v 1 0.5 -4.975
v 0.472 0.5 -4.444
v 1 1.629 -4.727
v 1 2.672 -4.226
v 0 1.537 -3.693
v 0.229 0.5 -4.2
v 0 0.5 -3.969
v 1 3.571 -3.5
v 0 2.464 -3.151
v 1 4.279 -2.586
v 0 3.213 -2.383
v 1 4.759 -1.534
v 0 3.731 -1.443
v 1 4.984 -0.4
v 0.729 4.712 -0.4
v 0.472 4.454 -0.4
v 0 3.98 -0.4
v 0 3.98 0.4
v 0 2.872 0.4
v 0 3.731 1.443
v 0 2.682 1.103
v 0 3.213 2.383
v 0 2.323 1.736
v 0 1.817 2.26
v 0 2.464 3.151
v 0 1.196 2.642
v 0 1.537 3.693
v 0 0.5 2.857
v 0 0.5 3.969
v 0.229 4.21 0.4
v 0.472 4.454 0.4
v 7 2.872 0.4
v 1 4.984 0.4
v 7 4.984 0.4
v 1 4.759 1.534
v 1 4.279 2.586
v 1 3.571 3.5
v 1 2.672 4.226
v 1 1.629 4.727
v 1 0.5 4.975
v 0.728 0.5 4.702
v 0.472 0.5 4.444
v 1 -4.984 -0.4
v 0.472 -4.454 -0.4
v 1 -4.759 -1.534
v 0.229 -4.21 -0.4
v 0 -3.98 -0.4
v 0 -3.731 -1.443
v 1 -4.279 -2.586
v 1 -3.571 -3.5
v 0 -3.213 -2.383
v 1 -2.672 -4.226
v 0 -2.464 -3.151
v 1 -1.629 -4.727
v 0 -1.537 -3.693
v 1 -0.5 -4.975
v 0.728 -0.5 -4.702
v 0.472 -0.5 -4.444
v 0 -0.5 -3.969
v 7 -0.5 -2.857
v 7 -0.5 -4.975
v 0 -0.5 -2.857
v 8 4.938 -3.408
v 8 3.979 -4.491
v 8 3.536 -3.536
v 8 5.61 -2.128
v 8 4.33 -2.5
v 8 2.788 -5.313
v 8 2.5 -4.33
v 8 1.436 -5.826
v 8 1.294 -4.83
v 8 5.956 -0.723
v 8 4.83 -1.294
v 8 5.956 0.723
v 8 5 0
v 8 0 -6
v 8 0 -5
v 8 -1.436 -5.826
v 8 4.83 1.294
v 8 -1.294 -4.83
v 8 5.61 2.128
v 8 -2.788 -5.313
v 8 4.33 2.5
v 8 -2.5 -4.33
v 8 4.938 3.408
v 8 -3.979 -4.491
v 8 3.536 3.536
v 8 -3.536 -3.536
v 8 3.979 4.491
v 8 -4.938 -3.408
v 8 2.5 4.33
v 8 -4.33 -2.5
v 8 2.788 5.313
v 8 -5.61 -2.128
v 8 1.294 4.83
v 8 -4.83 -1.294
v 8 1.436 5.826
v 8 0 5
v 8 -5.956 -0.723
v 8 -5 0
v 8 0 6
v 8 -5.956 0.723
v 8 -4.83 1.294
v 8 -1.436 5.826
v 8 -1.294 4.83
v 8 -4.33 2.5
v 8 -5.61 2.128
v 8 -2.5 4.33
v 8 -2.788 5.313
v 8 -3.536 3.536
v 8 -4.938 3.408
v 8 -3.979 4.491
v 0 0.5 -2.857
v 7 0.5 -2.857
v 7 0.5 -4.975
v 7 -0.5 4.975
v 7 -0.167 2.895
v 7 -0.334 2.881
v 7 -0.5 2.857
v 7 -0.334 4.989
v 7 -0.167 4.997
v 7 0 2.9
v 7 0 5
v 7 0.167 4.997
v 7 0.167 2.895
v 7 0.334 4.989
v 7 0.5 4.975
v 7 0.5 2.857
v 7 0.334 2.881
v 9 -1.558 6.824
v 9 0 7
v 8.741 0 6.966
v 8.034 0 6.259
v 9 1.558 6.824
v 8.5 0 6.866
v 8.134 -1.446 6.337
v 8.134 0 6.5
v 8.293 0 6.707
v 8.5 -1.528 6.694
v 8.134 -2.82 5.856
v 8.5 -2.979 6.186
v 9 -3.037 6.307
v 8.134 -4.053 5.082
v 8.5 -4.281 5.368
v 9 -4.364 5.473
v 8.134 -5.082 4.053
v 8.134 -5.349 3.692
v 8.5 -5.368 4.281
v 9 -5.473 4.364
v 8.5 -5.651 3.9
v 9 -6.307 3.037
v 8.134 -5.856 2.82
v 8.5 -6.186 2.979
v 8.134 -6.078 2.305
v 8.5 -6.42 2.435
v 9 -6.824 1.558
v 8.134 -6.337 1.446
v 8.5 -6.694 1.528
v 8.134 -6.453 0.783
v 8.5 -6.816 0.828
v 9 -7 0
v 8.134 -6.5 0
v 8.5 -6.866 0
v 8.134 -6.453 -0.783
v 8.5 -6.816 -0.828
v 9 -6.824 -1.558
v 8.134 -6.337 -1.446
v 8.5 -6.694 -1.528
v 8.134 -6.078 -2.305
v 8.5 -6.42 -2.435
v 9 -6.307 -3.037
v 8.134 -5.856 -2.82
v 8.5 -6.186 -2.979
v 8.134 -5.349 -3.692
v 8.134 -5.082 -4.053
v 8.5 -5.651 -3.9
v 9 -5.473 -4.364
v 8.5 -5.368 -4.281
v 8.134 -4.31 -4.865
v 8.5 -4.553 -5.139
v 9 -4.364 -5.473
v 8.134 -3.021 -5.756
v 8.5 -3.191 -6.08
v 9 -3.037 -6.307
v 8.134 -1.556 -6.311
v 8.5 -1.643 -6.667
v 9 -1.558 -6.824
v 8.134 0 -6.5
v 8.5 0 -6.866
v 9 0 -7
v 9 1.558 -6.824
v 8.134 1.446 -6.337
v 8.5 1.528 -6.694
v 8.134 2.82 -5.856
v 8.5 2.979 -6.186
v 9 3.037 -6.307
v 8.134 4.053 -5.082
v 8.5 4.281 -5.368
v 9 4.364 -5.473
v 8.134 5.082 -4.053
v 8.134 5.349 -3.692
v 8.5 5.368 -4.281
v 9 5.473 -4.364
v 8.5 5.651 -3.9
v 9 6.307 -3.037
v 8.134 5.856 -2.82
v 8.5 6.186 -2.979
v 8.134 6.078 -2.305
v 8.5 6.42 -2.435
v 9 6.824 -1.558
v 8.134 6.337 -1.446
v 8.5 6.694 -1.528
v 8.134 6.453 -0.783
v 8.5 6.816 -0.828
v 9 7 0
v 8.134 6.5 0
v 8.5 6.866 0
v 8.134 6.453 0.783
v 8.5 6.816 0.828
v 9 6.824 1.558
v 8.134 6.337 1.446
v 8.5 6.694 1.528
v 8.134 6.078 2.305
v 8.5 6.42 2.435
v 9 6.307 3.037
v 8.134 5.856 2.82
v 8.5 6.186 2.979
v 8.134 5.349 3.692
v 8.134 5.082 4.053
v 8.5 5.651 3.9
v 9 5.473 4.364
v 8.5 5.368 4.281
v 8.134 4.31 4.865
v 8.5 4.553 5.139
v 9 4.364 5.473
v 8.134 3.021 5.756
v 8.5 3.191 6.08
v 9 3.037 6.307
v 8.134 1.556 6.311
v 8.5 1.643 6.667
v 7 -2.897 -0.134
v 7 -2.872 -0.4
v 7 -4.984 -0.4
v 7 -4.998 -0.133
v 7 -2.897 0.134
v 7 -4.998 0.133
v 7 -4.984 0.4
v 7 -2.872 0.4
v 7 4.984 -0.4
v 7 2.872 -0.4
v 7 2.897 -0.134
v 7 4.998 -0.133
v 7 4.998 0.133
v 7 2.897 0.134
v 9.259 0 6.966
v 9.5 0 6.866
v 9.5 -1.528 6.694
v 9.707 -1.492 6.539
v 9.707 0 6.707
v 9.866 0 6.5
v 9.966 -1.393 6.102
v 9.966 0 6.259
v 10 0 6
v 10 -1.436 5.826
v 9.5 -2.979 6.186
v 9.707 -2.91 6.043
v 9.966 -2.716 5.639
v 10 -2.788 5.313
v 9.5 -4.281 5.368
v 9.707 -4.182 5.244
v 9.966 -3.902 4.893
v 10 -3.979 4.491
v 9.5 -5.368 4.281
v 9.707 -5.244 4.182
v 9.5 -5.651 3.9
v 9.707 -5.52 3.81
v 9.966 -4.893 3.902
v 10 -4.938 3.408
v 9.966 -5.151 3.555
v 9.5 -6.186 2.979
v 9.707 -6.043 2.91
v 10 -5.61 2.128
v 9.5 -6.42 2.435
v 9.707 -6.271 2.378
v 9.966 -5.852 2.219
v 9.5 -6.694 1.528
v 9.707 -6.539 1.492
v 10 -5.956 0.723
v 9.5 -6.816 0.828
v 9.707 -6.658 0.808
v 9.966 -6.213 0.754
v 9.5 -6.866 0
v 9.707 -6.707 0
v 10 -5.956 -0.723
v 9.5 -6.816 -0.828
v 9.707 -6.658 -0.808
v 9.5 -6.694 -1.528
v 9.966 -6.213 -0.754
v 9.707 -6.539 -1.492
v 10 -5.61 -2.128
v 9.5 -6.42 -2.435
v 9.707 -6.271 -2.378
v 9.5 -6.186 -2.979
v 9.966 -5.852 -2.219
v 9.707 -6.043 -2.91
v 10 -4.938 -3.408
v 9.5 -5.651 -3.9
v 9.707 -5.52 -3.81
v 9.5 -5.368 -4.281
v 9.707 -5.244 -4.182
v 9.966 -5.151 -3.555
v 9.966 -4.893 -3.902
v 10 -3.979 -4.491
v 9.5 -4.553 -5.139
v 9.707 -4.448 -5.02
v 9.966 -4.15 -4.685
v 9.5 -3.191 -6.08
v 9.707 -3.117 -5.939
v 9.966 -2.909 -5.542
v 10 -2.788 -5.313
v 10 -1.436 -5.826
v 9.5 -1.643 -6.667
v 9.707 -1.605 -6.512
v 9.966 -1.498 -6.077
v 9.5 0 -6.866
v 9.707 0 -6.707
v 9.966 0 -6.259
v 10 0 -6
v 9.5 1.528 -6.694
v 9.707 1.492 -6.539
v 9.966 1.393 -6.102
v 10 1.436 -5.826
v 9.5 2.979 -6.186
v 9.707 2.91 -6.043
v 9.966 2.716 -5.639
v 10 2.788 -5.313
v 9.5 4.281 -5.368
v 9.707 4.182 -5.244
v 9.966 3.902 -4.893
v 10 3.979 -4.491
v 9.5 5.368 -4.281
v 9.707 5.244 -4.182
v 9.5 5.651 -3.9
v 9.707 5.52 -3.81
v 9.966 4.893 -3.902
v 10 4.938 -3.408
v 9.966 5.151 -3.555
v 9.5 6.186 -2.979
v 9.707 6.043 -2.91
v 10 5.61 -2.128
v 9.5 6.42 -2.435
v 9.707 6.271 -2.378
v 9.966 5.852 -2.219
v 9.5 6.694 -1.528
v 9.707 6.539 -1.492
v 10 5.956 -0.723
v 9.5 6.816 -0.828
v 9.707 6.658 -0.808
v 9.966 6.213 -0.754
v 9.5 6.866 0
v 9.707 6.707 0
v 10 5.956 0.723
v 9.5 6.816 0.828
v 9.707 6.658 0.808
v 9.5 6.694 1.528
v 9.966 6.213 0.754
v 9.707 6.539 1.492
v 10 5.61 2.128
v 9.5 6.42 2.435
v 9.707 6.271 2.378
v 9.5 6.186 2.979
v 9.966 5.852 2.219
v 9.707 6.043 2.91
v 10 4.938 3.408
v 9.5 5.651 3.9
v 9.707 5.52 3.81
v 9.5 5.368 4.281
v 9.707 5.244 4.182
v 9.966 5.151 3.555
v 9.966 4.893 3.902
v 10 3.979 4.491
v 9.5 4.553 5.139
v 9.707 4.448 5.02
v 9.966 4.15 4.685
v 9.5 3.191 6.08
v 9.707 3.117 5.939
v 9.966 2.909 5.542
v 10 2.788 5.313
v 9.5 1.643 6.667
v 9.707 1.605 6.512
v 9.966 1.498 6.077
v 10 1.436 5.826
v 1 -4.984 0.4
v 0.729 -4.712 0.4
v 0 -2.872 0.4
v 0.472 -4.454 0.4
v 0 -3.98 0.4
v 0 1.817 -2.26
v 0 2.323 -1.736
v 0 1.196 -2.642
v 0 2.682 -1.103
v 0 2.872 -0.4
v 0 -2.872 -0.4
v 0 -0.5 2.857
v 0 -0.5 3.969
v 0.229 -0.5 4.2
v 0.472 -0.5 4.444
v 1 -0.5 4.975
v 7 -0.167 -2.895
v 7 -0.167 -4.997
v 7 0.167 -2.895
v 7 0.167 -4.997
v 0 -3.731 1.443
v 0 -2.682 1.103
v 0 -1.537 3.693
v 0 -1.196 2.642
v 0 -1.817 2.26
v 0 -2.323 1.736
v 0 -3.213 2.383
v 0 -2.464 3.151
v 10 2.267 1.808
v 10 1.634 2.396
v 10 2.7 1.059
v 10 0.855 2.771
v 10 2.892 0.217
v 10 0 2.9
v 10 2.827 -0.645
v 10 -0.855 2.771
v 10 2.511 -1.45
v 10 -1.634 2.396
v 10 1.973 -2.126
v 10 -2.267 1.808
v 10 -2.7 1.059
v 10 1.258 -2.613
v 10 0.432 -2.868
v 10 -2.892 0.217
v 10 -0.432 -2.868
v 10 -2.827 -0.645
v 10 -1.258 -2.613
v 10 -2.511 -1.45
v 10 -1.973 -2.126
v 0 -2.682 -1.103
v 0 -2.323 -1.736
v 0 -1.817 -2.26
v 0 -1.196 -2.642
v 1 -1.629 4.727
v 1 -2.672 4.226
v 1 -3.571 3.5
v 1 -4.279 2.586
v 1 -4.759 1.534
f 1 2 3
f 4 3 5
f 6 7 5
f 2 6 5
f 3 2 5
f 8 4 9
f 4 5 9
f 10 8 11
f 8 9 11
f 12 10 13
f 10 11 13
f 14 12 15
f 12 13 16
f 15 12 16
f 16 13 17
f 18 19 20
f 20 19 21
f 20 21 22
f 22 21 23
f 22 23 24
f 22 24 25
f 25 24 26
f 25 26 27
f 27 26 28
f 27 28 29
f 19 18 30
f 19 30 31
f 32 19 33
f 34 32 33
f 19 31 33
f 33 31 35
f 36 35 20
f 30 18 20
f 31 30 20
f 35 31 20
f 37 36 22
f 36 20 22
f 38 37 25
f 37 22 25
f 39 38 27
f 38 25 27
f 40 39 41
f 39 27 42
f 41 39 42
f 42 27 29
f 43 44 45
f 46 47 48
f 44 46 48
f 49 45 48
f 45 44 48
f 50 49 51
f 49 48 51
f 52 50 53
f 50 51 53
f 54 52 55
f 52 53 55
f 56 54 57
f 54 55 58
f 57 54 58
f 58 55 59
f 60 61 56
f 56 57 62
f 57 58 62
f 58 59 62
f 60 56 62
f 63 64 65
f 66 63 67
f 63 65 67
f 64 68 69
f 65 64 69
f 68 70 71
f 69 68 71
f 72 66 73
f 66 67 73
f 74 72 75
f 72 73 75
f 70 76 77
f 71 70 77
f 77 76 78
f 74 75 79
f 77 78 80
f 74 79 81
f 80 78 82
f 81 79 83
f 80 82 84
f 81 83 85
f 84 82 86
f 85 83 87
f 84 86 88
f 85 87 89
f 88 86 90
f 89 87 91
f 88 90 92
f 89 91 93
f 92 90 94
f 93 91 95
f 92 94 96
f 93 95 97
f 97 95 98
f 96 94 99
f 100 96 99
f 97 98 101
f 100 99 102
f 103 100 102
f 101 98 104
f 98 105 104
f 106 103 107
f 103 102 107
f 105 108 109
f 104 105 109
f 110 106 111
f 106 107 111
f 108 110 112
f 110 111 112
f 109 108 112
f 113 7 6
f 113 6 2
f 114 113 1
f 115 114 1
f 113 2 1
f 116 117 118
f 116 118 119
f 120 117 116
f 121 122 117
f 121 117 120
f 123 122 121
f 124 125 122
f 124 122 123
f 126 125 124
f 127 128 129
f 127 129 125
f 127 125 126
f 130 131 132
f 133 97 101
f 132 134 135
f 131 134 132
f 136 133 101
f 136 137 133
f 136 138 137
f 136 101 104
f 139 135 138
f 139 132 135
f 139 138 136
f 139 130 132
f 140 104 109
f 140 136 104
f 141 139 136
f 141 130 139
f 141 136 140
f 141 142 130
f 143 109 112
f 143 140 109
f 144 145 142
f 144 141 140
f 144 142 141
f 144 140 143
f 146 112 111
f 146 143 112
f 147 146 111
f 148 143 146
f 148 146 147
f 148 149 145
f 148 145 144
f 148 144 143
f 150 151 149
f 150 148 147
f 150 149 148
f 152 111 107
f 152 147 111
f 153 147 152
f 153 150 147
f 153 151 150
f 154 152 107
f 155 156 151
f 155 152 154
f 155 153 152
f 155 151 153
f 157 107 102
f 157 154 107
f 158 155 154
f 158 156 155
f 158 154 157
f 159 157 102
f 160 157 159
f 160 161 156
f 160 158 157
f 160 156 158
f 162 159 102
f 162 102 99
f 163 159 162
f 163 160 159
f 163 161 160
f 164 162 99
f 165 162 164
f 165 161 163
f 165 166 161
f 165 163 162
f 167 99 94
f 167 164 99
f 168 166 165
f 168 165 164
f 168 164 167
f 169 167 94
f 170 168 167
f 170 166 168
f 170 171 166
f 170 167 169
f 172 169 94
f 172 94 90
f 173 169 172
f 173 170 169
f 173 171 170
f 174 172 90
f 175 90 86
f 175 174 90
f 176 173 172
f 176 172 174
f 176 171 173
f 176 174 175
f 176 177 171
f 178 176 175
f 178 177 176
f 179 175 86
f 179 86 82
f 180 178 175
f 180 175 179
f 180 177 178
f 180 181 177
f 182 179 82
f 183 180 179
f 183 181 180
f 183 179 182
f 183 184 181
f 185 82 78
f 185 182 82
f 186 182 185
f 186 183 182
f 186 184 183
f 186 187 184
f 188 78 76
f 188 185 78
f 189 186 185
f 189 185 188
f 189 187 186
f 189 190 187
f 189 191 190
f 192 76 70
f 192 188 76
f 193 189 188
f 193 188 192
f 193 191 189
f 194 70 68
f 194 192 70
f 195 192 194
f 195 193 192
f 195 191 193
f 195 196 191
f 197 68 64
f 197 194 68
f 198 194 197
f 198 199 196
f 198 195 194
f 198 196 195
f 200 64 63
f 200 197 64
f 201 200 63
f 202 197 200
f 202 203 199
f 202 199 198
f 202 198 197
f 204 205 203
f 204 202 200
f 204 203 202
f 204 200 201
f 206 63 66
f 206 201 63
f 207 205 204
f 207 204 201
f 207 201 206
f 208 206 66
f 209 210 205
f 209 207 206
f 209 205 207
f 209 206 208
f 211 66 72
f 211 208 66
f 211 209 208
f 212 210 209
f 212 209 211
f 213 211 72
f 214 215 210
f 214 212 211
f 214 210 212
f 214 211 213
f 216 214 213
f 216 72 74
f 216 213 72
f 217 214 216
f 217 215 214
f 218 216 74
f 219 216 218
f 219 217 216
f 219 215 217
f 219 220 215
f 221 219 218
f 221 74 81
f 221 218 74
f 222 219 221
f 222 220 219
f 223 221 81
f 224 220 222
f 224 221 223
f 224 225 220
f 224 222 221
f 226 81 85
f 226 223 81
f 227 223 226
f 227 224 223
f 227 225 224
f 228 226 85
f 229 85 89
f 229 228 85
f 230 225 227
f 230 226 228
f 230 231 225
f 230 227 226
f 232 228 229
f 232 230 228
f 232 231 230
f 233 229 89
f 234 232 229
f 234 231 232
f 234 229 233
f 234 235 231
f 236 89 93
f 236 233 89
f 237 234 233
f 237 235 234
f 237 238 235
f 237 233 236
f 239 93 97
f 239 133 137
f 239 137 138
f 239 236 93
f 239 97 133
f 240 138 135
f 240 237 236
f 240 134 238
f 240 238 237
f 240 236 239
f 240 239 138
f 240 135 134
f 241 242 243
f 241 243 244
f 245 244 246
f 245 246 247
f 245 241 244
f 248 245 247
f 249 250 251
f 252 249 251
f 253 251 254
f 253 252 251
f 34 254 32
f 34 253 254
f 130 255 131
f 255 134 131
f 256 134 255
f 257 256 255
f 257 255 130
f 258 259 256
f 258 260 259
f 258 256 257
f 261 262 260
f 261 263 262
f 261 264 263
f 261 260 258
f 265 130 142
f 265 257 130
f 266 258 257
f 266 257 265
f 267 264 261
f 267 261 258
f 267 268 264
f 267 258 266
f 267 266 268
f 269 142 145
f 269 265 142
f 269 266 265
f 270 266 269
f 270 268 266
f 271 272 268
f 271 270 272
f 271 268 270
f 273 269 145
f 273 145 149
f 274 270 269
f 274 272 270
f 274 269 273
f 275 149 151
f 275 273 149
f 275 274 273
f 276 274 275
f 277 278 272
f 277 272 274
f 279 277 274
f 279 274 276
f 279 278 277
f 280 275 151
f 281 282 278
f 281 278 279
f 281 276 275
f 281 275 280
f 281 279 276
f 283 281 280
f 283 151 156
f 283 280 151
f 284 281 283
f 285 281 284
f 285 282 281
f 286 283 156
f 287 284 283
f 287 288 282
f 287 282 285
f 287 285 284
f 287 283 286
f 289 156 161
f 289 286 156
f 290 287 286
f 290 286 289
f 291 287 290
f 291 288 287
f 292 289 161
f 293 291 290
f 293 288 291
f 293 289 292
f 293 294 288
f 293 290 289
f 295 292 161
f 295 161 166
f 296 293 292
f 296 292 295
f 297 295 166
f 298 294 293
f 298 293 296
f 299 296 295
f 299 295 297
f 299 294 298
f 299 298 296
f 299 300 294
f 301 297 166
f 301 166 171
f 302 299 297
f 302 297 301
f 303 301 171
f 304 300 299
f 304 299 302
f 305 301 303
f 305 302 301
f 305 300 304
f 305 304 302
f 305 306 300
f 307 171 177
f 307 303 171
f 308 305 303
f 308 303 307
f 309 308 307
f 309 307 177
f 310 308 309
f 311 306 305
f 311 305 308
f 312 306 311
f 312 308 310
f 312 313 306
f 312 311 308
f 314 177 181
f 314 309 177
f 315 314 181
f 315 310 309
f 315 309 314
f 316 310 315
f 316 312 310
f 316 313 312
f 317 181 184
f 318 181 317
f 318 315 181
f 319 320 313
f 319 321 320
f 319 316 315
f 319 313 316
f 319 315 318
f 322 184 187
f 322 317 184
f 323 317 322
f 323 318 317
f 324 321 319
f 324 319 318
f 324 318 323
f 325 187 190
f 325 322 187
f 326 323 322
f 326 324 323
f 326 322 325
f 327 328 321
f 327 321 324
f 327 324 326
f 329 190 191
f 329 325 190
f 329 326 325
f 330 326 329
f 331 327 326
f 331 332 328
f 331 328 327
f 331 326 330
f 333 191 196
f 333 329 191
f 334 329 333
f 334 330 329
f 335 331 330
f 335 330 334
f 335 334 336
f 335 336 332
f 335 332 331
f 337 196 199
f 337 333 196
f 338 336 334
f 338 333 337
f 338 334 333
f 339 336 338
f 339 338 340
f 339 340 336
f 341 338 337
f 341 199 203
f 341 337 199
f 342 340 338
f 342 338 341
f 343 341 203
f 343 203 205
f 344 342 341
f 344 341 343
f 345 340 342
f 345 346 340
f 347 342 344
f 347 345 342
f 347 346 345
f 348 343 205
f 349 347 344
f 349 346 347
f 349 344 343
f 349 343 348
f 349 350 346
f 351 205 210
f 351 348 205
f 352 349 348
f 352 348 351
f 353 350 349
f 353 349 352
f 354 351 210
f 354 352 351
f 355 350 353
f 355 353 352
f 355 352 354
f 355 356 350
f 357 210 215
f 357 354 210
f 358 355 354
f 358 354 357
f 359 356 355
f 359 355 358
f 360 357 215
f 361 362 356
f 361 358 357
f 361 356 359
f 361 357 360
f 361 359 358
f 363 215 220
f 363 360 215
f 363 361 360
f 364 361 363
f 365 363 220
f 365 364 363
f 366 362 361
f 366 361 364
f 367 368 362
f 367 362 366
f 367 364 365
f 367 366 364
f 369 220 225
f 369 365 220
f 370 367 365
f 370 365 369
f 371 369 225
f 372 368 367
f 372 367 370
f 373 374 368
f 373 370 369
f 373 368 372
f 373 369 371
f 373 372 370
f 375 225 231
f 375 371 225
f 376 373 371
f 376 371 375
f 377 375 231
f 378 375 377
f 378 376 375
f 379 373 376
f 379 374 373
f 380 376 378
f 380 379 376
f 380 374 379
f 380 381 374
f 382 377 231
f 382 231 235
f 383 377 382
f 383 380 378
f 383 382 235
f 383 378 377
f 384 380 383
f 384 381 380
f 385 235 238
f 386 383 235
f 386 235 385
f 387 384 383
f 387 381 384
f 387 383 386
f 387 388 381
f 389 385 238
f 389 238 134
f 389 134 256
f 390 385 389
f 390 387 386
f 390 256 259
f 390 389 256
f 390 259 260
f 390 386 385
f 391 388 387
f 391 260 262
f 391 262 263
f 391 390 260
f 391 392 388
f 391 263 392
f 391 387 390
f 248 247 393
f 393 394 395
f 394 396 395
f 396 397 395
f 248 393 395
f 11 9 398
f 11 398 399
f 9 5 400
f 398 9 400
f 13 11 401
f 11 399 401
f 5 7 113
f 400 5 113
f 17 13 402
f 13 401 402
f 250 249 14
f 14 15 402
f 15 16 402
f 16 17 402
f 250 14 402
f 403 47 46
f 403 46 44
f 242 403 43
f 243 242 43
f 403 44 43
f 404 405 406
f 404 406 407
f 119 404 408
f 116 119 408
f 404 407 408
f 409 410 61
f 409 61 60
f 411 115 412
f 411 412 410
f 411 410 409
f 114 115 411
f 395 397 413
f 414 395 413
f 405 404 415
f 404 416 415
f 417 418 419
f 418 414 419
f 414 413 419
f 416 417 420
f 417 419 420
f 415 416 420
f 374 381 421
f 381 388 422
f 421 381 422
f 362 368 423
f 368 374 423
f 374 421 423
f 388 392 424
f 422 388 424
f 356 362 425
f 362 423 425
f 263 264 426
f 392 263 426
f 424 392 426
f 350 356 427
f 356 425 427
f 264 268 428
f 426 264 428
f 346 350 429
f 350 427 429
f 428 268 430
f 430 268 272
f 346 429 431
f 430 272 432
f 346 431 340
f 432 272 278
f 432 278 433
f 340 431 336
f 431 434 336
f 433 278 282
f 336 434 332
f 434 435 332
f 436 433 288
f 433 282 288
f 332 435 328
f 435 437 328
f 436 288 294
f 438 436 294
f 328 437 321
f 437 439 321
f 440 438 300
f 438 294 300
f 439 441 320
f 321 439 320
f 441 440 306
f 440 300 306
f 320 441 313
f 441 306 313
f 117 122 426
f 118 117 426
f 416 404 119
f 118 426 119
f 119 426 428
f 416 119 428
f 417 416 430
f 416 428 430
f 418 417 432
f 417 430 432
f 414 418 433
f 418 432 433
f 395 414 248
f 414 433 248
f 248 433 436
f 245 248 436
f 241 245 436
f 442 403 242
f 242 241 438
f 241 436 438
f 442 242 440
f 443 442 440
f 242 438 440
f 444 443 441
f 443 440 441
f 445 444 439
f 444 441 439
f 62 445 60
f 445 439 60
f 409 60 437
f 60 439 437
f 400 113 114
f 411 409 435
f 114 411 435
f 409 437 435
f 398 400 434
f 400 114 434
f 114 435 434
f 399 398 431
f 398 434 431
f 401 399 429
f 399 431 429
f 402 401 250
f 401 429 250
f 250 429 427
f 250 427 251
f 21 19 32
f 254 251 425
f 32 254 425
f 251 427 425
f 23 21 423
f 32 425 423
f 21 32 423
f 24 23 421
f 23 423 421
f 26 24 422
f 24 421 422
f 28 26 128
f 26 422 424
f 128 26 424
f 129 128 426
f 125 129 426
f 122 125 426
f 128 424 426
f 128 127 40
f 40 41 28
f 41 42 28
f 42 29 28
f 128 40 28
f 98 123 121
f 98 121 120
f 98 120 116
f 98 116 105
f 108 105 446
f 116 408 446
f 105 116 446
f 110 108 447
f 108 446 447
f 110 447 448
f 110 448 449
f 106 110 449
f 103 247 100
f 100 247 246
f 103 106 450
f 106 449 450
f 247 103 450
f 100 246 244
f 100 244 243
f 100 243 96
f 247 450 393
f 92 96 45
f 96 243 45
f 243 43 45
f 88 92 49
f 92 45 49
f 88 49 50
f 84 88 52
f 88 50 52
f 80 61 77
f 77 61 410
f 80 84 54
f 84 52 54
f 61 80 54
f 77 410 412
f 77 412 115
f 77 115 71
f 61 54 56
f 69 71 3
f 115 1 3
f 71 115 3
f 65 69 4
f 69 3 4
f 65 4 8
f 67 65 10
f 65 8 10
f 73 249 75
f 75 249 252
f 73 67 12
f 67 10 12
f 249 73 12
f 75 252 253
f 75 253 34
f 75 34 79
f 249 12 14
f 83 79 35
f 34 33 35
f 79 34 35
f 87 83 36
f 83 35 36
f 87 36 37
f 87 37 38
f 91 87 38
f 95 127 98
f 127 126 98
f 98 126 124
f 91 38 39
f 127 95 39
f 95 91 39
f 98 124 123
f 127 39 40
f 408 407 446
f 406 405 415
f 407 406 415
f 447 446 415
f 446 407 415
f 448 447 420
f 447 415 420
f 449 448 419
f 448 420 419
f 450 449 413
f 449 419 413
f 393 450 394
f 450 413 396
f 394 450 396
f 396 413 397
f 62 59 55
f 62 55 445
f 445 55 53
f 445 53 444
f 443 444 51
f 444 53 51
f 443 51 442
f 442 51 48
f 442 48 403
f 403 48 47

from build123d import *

# Parameters (mm, degrees)
CHAMFER_1_SIZE      = 1
FILLET_1_R          = 1
CUT_EXTRUDE_1_DEPTH = 7


with BuildPart() as part:
    # Эскиз1 → Повернуть1 (revolve)
    with BuildSketch(Plane.XY, mode=Mode.PRIVATE) as revolve_1_sk:
        Polygon((10, 2.9), (10, 7), (8, 7), (8, 5), (0, 5), (0, 2.9), align=None)
    revolve(revolve_1_sk.sketch.rotate(Axis((0, 0, 0), (1, 0, 0)), 90), axis=Axis((0, 0, 0), (1, 0, 0)))

    # Фаска1
    chamfer_1_edges = [part.edges().sort_by_distance(p)[0] for p in [
        (0, 0, -5),
    ]]
    chamfer(chamfer_1_edges, length=CHAMFER_1_SIZE)

    # Скругление1
    fillet_1_edges = [part.edges().sort_by_distance(p)[0] for p in [
        (10, 0, -7),
        (8, 0, -7),
    ]]
    fillet(fillet_1_edges, radius=FILLET_1_R - 0.0001)  # a hair under: the kernel refuses the full size

    # Эскиз2 → Вырез-Вытянуть1 (cut)
    with BuildSketch(Plane.ZY):
        Polygon((-6, -0.5), (-0.399521329, -0.5), (-0.399521329, -5.986683782), (0.399521329, -5.986683782), (0.399521329, -0.5), (6, -0.5), (6, 0.5), (0.399521329, 0.5), (0.399521329, 5.986683782), (-0.399521329, 5.986683782), (-0.399521329, 0.5), (-6, 0.5), align=None)
    extrude(amount=-CUT_EXTRUDE_1_DEPTH, mode=Mode.SUBTRACT)


solid = part.part
